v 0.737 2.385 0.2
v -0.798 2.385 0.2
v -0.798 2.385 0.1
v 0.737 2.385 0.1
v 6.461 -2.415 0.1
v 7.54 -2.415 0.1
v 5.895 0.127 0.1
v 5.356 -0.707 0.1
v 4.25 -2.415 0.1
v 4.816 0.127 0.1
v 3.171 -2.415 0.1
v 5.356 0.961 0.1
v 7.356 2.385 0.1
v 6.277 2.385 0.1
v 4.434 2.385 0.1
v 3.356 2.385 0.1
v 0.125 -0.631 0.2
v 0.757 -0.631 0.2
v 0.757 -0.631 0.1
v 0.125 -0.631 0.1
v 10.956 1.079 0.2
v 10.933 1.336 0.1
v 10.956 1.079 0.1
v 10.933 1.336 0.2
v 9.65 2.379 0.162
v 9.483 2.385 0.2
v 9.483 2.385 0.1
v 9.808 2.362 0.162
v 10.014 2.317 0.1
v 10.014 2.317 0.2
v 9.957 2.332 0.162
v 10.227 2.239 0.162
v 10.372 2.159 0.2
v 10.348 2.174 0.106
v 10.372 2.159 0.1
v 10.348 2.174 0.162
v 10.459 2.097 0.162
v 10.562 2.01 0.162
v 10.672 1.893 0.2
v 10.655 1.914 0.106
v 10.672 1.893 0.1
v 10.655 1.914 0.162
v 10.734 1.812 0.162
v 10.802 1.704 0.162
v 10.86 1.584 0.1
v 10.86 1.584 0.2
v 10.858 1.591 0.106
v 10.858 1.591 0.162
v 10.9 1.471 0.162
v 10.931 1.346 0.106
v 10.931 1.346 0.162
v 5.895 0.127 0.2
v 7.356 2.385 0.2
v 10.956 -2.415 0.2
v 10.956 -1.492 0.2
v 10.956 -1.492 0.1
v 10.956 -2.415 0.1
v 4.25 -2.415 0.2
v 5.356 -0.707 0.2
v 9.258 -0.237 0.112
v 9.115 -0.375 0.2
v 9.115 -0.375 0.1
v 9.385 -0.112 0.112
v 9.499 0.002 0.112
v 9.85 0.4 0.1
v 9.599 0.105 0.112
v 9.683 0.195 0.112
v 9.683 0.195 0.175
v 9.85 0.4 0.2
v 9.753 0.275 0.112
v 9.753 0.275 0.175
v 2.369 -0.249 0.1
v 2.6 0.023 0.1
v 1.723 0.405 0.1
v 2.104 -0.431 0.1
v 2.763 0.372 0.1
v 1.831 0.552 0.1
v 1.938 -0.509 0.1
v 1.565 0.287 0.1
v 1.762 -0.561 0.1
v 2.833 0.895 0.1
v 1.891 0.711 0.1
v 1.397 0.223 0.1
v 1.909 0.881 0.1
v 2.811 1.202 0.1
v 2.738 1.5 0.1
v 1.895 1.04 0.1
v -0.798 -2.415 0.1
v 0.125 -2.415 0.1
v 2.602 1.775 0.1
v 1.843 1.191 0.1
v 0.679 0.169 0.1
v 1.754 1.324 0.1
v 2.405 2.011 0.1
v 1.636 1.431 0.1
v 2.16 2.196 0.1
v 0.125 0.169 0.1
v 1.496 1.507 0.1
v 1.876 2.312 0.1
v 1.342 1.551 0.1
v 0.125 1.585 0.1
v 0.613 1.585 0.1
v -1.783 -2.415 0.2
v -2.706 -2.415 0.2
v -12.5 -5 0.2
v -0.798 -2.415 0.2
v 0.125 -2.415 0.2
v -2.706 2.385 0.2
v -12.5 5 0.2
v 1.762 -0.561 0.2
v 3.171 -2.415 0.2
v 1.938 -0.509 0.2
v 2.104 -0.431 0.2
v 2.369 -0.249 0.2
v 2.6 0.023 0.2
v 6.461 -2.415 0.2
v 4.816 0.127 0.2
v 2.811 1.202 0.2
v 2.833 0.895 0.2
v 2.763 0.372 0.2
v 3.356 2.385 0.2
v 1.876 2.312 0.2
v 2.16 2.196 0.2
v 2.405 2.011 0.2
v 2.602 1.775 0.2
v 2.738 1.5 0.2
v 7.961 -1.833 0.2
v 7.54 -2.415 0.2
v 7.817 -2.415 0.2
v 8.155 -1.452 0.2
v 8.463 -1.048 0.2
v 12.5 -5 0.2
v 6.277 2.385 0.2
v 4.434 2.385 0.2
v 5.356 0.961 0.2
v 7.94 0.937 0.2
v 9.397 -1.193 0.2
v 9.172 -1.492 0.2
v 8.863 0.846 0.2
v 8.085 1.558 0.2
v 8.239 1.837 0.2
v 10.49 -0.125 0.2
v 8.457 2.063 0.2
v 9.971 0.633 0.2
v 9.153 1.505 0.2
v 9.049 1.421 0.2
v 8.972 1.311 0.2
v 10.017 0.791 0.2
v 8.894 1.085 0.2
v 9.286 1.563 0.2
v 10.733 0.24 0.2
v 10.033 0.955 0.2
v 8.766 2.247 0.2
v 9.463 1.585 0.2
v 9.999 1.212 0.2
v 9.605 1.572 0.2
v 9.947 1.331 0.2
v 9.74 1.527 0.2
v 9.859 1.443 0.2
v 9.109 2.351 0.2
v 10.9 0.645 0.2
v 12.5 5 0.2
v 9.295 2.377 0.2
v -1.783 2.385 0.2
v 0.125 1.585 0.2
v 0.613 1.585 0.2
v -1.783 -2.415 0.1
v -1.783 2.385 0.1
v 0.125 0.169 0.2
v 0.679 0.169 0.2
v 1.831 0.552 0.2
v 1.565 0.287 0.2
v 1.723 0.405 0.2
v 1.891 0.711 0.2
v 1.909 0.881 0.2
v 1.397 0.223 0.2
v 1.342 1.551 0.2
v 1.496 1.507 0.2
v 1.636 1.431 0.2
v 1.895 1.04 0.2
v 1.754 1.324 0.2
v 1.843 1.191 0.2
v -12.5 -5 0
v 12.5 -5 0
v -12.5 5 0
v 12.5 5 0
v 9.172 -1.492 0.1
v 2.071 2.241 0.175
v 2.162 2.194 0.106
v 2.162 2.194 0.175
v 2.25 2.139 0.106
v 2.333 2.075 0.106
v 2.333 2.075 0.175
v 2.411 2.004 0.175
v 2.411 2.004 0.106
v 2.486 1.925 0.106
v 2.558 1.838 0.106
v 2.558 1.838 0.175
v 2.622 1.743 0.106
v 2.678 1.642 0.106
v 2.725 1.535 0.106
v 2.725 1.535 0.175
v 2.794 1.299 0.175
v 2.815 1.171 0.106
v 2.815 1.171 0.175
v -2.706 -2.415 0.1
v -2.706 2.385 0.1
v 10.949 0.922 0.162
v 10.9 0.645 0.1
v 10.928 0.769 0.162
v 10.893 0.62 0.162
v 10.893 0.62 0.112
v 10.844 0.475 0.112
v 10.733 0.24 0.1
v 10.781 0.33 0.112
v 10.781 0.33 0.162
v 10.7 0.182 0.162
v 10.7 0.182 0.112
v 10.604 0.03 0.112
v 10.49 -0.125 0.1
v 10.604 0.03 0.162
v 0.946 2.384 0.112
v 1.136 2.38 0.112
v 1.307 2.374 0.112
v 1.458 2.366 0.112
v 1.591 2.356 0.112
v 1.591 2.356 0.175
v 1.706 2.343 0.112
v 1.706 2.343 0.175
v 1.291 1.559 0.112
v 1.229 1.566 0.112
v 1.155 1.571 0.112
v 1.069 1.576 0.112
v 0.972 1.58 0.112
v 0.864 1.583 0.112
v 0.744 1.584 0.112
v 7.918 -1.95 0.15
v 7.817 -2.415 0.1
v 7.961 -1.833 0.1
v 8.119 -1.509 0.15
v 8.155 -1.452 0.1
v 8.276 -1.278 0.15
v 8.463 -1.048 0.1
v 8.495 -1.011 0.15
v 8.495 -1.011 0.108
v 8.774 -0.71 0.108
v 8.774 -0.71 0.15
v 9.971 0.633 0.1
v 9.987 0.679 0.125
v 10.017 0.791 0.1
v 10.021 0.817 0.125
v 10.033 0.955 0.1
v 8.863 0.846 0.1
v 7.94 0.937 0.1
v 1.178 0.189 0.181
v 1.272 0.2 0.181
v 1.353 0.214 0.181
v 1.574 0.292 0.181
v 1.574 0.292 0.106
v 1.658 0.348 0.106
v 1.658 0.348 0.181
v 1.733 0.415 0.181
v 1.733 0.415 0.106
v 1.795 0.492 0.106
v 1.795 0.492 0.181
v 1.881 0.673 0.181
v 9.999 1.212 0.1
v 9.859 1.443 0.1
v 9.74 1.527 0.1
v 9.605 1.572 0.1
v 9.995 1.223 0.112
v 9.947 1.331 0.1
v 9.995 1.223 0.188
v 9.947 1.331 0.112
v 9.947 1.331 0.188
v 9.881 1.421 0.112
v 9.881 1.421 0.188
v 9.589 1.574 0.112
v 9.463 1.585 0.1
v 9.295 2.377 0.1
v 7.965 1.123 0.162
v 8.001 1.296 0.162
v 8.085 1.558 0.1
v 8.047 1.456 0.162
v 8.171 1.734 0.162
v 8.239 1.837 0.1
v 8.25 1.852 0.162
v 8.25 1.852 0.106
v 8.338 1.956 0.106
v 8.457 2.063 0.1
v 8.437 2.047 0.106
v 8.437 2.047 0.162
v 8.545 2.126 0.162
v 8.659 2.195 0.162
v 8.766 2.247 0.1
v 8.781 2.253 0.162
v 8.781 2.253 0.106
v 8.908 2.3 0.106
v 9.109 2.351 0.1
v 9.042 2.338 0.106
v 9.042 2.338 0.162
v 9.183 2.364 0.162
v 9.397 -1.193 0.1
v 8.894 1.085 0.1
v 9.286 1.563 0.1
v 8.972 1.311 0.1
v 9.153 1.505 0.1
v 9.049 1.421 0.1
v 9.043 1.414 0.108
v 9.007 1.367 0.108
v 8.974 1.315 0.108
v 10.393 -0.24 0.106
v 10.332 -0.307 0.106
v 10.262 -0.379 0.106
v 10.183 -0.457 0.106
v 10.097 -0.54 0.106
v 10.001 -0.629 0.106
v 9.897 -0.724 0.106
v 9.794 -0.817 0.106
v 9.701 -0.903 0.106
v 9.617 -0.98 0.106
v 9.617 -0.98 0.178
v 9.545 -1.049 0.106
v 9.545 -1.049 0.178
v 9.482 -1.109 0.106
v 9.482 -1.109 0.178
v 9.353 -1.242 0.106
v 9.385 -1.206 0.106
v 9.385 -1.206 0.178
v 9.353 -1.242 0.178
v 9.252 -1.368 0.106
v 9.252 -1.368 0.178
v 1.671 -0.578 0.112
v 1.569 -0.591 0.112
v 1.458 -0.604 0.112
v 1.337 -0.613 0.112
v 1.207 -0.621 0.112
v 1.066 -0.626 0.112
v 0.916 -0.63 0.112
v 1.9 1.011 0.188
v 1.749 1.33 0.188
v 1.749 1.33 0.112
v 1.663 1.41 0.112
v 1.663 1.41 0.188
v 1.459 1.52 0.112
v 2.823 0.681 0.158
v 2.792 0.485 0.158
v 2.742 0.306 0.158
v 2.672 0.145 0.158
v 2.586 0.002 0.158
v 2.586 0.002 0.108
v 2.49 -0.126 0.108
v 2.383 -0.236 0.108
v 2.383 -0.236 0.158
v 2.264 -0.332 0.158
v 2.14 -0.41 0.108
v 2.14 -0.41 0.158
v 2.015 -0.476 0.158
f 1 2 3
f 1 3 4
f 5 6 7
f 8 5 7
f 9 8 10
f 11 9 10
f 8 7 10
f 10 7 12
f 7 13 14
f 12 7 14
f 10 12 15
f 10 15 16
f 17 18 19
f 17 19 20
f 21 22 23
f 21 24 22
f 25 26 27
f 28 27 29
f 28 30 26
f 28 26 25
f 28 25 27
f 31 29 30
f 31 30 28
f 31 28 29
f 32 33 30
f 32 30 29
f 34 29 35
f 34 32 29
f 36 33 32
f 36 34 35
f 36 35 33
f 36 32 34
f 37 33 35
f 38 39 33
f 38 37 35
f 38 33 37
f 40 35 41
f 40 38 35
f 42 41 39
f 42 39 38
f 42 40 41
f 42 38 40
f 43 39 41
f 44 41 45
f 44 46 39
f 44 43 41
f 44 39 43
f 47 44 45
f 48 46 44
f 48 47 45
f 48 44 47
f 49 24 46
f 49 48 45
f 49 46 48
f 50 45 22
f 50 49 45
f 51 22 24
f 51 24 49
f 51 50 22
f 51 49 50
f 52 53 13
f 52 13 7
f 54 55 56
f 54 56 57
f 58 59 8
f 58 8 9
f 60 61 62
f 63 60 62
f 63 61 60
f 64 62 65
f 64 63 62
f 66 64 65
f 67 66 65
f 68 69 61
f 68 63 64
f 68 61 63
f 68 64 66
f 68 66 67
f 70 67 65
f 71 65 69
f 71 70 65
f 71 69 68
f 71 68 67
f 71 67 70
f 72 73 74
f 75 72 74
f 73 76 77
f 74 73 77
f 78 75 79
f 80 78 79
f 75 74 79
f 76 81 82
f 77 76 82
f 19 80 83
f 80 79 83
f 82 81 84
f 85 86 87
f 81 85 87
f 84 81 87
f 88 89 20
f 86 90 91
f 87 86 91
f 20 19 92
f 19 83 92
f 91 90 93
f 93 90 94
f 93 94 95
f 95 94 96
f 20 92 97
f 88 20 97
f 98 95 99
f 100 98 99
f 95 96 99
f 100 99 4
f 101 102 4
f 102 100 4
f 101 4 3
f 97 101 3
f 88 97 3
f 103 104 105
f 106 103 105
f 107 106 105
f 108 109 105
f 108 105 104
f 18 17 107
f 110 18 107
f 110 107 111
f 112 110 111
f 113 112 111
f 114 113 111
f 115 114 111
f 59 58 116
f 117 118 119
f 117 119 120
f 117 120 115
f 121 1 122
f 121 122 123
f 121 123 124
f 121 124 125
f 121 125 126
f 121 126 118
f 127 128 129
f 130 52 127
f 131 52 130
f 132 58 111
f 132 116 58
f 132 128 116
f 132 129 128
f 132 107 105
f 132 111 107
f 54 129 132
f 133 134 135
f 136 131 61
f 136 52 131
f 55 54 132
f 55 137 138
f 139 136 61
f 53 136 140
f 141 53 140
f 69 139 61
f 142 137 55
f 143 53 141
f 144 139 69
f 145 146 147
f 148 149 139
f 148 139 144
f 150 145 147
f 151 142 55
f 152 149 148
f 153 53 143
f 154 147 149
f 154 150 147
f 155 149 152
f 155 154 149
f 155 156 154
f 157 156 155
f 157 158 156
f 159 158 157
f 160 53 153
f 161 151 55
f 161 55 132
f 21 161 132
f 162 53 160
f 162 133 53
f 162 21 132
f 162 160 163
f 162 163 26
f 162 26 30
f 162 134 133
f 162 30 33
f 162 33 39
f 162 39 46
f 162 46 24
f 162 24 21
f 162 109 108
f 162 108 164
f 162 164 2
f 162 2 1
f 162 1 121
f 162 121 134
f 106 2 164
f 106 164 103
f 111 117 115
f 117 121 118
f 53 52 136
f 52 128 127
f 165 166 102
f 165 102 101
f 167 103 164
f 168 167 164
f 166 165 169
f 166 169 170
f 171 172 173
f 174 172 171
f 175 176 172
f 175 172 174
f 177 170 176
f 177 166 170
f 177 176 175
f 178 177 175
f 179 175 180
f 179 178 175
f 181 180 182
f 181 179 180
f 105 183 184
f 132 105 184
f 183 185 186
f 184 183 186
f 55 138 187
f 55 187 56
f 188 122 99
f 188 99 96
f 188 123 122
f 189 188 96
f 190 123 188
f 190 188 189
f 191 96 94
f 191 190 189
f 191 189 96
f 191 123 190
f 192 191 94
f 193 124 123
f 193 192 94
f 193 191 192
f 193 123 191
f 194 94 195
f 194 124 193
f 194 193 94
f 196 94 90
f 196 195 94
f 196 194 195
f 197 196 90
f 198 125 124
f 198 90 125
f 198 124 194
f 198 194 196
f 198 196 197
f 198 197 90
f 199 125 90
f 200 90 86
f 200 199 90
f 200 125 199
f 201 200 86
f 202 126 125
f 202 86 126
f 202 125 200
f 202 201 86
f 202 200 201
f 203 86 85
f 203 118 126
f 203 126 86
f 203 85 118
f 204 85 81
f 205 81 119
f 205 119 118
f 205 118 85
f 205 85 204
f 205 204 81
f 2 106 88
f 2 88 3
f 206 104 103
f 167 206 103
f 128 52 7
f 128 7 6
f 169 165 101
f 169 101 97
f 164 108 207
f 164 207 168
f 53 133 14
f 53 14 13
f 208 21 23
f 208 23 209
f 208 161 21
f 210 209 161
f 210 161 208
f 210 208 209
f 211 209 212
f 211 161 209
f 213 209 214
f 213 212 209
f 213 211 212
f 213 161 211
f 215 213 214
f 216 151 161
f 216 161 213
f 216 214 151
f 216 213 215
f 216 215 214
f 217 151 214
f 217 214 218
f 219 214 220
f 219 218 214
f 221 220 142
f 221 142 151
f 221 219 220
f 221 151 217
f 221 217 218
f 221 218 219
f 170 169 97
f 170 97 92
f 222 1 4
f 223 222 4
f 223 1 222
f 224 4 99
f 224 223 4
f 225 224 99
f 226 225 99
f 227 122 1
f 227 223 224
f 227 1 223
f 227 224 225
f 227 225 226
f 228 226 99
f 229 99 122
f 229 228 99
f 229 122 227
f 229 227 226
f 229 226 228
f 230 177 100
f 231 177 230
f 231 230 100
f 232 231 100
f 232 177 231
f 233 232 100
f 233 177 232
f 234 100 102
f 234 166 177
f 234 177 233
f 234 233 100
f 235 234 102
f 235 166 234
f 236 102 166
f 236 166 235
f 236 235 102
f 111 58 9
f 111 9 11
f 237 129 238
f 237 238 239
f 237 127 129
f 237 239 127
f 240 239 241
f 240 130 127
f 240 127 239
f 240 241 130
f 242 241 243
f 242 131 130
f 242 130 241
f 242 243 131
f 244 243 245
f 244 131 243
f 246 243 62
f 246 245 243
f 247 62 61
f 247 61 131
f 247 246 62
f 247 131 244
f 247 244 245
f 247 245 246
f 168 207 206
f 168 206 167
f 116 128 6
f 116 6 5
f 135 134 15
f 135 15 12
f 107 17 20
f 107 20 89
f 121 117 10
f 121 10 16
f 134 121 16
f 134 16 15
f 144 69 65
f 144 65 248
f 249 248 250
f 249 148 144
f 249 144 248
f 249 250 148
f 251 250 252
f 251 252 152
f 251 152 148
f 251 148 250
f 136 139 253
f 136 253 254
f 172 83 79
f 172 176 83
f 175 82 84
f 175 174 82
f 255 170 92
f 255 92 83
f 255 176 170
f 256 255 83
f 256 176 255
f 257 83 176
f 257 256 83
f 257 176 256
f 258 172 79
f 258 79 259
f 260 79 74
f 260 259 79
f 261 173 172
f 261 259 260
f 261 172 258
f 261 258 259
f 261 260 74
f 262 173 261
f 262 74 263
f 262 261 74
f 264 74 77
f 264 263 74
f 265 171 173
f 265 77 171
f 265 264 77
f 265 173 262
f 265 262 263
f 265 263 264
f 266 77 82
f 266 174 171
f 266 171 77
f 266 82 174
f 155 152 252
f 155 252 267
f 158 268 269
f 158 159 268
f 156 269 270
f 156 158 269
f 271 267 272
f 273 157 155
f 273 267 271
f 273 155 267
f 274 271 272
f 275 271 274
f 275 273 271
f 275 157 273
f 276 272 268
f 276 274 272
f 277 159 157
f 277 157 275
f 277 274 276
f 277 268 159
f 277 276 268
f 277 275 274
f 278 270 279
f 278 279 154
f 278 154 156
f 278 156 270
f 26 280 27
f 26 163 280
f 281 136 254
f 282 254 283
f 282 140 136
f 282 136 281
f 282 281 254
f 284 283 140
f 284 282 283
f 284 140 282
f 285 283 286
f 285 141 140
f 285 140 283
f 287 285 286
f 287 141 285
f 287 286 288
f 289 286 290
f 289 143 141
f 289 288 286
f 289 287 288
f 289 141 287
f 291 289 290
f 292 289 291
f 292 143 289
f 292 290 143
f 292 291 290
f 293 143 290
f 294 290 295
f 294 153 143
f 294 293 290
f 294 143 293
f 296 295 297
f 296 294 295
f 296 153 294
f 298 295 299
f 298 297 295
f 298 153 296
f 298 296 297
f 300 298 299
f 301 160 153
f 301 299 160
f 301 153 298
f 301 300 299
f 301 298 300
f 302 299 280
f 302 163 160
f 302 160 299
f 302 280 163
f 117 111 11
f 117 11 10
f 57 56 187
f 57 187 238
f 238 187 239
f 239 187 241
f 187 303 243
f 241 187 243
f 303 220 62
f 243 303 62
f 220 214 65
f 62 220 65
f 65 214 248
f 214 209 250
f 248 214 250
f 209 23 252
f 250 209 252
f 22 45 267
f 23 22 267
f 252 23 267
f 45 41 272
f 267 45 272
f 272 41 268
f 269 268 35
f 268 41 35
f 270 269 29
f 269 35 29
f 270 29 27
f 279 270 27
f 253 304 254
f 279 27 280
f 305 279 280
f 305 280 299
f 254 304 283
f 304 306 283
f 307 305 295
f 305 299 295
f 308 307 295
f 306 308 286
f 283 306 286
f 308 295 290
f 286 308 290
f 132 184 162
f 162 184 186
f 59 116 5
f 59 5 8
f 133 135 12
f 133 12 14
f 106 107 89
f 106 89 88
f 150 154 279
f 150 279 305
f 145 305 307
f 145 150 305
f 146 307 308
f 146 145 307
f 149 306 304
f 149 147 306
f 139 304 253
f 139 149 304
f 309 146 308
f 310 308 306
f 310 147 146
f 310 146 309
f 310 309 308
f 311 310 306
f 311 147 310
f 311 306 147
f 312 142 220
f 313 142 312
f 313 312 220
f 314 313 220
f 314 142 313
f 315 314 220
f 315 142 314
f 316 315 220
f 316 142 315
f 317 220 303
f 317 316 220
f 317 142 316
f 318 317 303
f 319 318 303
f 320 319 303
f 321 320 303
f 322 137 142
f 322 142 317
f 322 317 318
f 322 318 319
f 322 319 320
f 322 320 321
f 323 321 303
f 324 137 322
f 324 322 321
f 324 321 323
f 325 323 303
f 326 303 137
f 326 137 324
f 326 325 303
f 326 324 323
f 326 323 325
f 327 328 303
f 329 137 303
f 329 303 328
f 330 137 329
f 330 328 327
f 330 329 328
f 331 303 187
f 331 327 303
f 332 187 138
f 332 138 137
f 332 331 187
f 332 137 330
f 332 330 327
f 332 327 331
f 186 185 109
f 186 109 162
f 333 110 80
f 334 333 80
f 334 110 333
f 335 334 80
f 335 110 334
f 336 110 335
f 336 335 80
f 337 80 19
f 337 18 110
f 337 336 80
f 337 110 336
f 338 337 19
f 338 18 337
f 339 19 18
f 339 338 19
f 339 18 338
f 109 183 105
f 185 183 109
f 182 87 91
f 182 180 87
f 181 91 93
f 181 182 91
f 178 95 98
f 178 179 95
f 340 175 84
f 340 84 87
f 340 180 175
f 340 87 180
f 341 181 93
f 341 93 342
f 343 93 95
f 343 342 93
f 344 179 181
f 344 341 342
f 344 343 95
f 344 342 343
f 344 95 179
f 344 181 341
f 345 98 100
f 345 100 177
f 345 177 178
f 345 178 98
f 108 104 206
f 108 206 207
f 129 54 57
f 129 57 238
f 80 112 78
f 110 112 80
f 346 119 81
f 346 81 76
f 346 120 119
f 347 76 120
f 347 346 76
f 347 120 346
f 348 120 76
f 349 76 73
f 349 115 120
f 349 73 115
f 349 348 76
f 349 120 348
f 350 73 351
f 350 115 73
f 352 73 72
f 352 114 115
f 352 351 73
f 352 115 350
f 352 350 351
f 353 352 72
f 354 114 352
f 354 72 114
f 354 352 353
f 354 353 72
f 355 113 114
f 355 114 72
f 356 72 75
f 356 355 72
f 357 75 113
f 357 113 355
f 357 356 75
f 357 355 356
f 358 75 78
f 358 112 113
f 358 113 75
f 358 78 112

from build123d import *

# Parameters (mm, degrees)
SKETCH1_W           = 25
SKETCH1_H           = 10
BOSS_EXTRUDE1_DEPTH = 0.2
SKETCH2_W           = 0.923076923
SKETCH2_H           = 4.8
CUT_EXTRUDE1_DEPTH  = 0.1


with BuildPart() as part:
    # Sketch1 → Boss-Extrude1 (new body)
    with BuildSketch(Plane.XY):
        Rectangle(SKETCH1_W, SKETCH1_H)
    extrude(amount=BOSS_EXTRUDE1_DEPTH)

    # Sketch2 → Cut-Extrude1 (cut)
    # profile 1 of 4: a face of its own
    with BuildSketch(Plane.XY.offset(0.2)):
        with Locations((-2.244411501, -0.015241632)):
            Rectangle(SKETCH2_W, SKETCH2_H)
    # profile 2 of 4: a face of its own
    with BuildSketch(Plane.XY.offset(0.2)):
        with BuildLine():
            Line((-0.798257654, -2.415241632), (-0.798257654, 2.384758368))
            Line((-0.798257654, 2.384758368), (0.737319269, 2.384758368))
            add(Edge.make_bspline(
                [(0.737319269, 2.384758368), (0.806872824, 2.384682412), (0.939902268, 2.384537138), (1.129660722, 2.380500805), (1.300509782, 2.374786932), (1.452195879, 2.367670544), (1.585252756, 2.357051526), (1.699083537, 2.344754864), (1.794405005, 2.331526919), (1.850536994, 2.317837764), (1.875780807, 2.311681445)],
                knots=[0, 0, 0, 0, 1.460485487, 2.793352117, 3.985295279, 5.050041172, 5.981765236, 6.787433016, 7.454681457, 8, 8, 8, 8], degree=3))
            add(Edge.make_bspline(
                [(1.875780807, 2.311681445), (1.90934894, 2.302109877), (1.975973819, 2.283112556), (2.071426495, 2.242613286), (2.163427759, 2.195676794), (2.250821715, 2.139736978), (2.333905442, 2.075786969), (2.412925902, 2.004348288), (2.488304501, 1.925098444), (2.558998473, 1.838193992), (2.623745835, 1.744073149), (2.679703823, 1.642596759), (2.726584917, 1.534205891), (2.76652683, 1.419715089), (2.795996164, 1.297896825), (2.81661934, 1.169597507), (2.830975644, 1.034761019), (2.831992115, 0.942489924), (2.832511577, 0.895335291)],
                knots=[0, 0, 0, 0, 0.907145743, 1.80047177, 2.69161667, 3.591261238, 4.495029544, 5.415863088, 6.359363025, 7.337192411, 8.326890979, 9.326929023, 10.346104993, 11.395420813, 12.477187422, 13.601053412, 14.774031606, 16, 16, 16, 16], degree=3))
            add(Edge.make_bspline(
                [(2.832511577, 0.895335291), (2.831030074, 0.82372562), (2.828178101, 0.68587307), (2.796269582, 0.488244732), (2.747601242, 0.307723985), (2.676468945, 0.146049619), (2.589743899, 0.002587197), (2.494214475, -0.126743499), (2.385133912, -0.238044311), (2.267281986, -0.333111429), (2.142734039, -0.410910414), (2.017960635, -0.477232945), (1.891278139, -0.528223825), (1.804906295, -0.550440962), (1.762319269, -0.561395478)],
                knots=[0, 0, 0, 0, 1.312386234, 2.526415563, 3.661883817, 4.733421185, 5.753802465, 6.732107337, 7.675884281, 8.604170108, 9.50284679, 10.365392406, 11.194030444, 12, 12, 12, 12], degree=3))
            add(Edge.make_bspline(
                [(1.762319269, -0.561395478), (1.731922738, -0.567177613), (1.667850478, -0.579365662), (1.566235707, -0.591514929), (1.455165255, -0.604962844), (1.334182281, -0.613734329), (1.203433144, -0.621948457), (1.062968615, -0.625826618), (0.912989431, -0.630499015), (0.809759796, -0.630582972), (0.756550038, -0.630626247)],
                knots=[0, 0, 0, 0, 0.735353946, 1.55003838, 2.431865514, 3.394945452, 4.432993119, 5.54609699, 6.735134699, 8, 8, 8, 8], degree=3))
            Line((0.756550038, -0.630626247), (0.124819269, -0.630626247))
            Line((0.124819269, -0.630626247), (0.124819269, -2.415241632))
            Line((0.124819269, -2.415241632), (-0.798257654, -2.415241632))
        make_face()
        with BuildLine():
            Line((0.124819269, 1.584758368), (0.124819269, 0.169373753))
            Line((0.124819269, 0.169373753), (0.678665423, 0.169373753))
            add(Edge.make_bspline(
                [(0.678665423, 0.169373753), (0.726426028, 0.169435598), (0.817798074, 0.169553918), (0.948896691, 0.173800879), (1.067567284, 0.178985083), (1.174057811, 0.187566001), (1.267725465, 0.198875446), (1.349197518, 0.212402966), (1.418568922, 0.226919409), (1.493584651, 0.25097548), (1.573791463, 0.289896011), (1.659442913, 0.345834589), (1.73468761, 0.412715757), (1.797301172, 0.491265373), (1.847315545, 0.578538546), (1.883125873, 0.673640874), (1.906248568, 0.774996178), (1.908360615, 0.845207624), (1.909434654, 0.880912214)],
                knots=[0, 0, 0, 0, 1.411705958, 2.700771114, 3.876961699, 4.922619712, 5.858038221, 6.66485904, 7.363650596, 7.950905807, 8.989198271, 9.987739806, 10.967313358, 11.951275539, 12.944273208, 13.927870418, 14.946261014, 16, 16, 16, 16], degree=3))
            add(Edge.make_bspline(
                [(1.909434654, 0.880912214), (1.907923062, 0.924399848), (1.904992286, 1.008716635), (1.872674008, 1.128797813), (1.822810598, 1.237772937), (1.751520078, 1.3322513), (1.665402808, 1.411699834), (1.56861059, 1.477803839), (1.459076384, 1.524063925), (1.381555525, 1.541988001), (1.342126961, 1.551104522)],
                knots=[0, 0, 0, 0, 1.085904563, 2.105425768, 3.088705091, 4.068969419, 5.045188284, 6.010769642, 6.988240112, 8, 8, 8, 8], degree=3))
            add(Edge.make_bspline(
                [(1.342126961, 1.551104522), (1.325159949, 1.553818257), (1.287498444, 1.559841908), (1.224897357, 1.566128336), (1.150840262, 1.571845837), (1.065237889, 1.576540076), (0.968429546, 1.580209883), (0.860095914, 1.58342554), (0.74052231, 1.583683875), (0.656869768, 1.58439028), (0.613280807, 1.584758368)],
                knots=[0, 0, 0, 0, 0.564603001, 1.253243608, 2.066786758, 3.005752288, 4.070476343, 5.250658742, 6.567396469, 8, 8, 8, 8], degree=3))
            Line((0.613280807, 1.584758368), (0.124819269, 1.584758368))
        make_face(mode=Mode.SUBTRACT)
    # profile 3 of 4: a face of its own
    with BuildSketch(Plane.XY.offset(0.2)):
        Polygon((3.170973115, -2.415241632), (4.816165423, 0.12706606), (3.3555885, 2.384758368), (4.434434654, 2.384758368), (5.3555885, 0.960719906), (6.276742346, 2.384758368), (7.3555885, 2.384758368), (5.895011577, 0.12706606), (7.540203884, -2.415241632), (6.46135773, -2.415241632), (5.3555885, -0.706587786), (4.249819269, -2.415241632), align=None)
    # profile 4 of 4: a face of its own
    with BuildSketch(Plane.XY.offset(0.2)):
        with BuildLine():
            Line((10.9555885, -1.492164709), (10.9555885, -2.415241632))
            Line((10.9555885, -2.415241632), (7.817126961, -2.415241632))
            add(Edge.make_bspline(
                [(7.817126961, -2.415241632), (7.827753065, -2.336351316), (7.848999314, -2.178614919), (7.91468512, -1.948201744), (8.002353171, -1.723357854), (8.097500189, -1.540389503), (8.192134438, -1.393106276), (8.277996096, -1.272421263), (8.380425902, -1.144017588), (8.497937489, -1.006858679), (8.629881438, -0.86051578), (8.777242138, -0.705532962), (8.940722521, -0.542652172), (9.055733882, -0.432048101), (9.115203884, -0.374857017)],
                knots=[0, 0, 0, 0, 1.156289446, 2.311930546, 3.473459201, 4.661751613, 5.303057008, 6.018253237, 6.81459331, 7.690699809, 8.644447906, 9.679642995, 10.800191253, 12, 12, 12, 12], degree=3))
            add(Edge.make_bspline(
                [(9.115203884, -0.374857017), (9.162661627, -0.329047303), (9.25300719, -0.241839099), (9.381659449, -0.116960486), (9.49475804, -0.002161545), (9.594667701, 0.099582791), (9.679080375, 0.190863191), (9.749106435, 0.27024611), (9.805632752, 0.33805482), (9.836247454, 0.381072708), (9.849819269, 0.400142983)],
                knots=[0, 0, 0, 0, 1.480720495, 2.818855715, 4.024636094, 5.098235712, 6.019786162, 6.815086302, 7.474715479, 8, 8, 8, 8], degree=3))
            add(Edge.make_bspline(
                [(9.849819269, 0.400142983), (9.877611033, 0.446308072), (9.931218126, 0.53535518), (9.99000275, 0.675383368), (10.025287473, 0.815382631), (10.030129492, 0.908929337), (10.032511577, 0.954950676)],
                knots=[0, 0, 0, 0, 1.0911822, 2.104764037, 3.067617678, 4, 4, 4, 4], degree=3))
            add(Edge.make_bspline(
                [(10.032511577, 0.954950676), (10.030782777, 1.002842066), (10.027512022, 1.09344884), (10.000086181, 1.221311753), (9.951450902, 1.331228041), (9.884489072, 1.423535093), (9.799815705, 1.495857314), (9.700830076, 1.549296416), (9.586083195, 1.578841274), (9.505432318, 1.582727345), (9.463280807, 1.584758368)],
                knots=[0, 0, 0, 0, 1.193122327, 2.257294386, 3.237245624, 4.168877528, 5.075331632, 5.990371598, 6.949684428, 8, 8, 8, 8], degree=3))
            add(Edge.make_bspline(
                [(9.463280807, 1.584758368), (9.421414069, 1.582861545), (9.34053657, 1.579197291), (9.225592095, 1.547186877), (9.125036894, 1.491773483), (9.05337591, 1.428624575), (9.004965516, 1.367216849), (8.971980362, 1.31370406), (8.943549735, 1.252897122), (8.918357827, 1.185480619), (8.898459068, 1.110682223), (8.882433843, 1.0290716), (8.86951983, 0.94020957), (8.865412946, 0.878390798), (8.863280807, 0.846296829)],
                knots=[0, 0, 0, 0, 1.402788338, 2.709884207, 3.961032948, 5.225417836, 5.883680772, 6.578928686, 7.329201998, 8.132101139, 8.990263233, 9.922304639, 10.921339128, 12, 12, 12, 12], degree=3))
            Line((8.863280807, 0.846296829), (7.940203884, 0.936681445))
            add(Edge.make_bspline(
                [(7.940203884, 0.936681445), (7.94762528, 0.999000772), (7.96201418, 1.11982799), (7.997921921, 1.293377536), (8.043397745, 1.453484825), (8.100609637, 1.599852729), (8.167192961, 1.733412005), (8.24654402, 1.852158512), (8.335890203, 1.957407626), (8.435308726, 2.049103332), (8.544167554, 2.127537337), (8.658395361, 2.197551722), (8.780224478, 2.254985774), (8.908313561, 2.302320063), (9.042604726, 2.340149248), (9.183719088, 2.365161392), (9.33078574, 2.38275503), (9.431174051, 2.384080524), (9.482511577, 2.384758368)],
                knots=[0, 0, 0, 0, 1.270971563, 2.464210789, 3.586263665, 4.638946707, 5.643716971, 6.603612468, 7.52484387, 8.434700188, 9.336036235, 10.239171475, 11.145359471, 12.059630629, 13.003312604, 13.96741569, 14.960557767, 16, 16, 16, 16], degree=3))
            add(Edge.make_bspline(
                [(9.482511577, 2.384758368), (9.5383221, 2.383685719), (9.647020101, 2.3815966), (9.805699887, 2.364344637), (9.954768144, 2.334263341), (10.095528133, 2.294416407), (10.226534323, 2.241217837), (10.348878384, 2.176902977), (10.460634835, 2.09903095), (10.563469558, 2.011848446), (10.655395572, 1.915975961), (10.735914442, 1.813711747), (10.803372887, 1.70512705), (10.859980881, 1.5915454), (10.902011935, 1.471139101), (10.932637588, 1.345573044), (10.95294363, 1.214261436), (10.954697126, 1.124578586), (10.9555885, 1.078989137)],
                knots=[0, 0, 0, 0, 1.210756838, 2.35810096, 3.457354827, 4.507168606, 5.527358126, 6.519769748, 7.499700793, 8.476517721, 9.440526811, 10.376769937, 11.295256217, 12.209626307, 13.124630862, 14.055668209, 15.011616881, 16, 16, 16, 16], degree=3))
            add(Edge.make_bspline(
                [(10.9555885, 1.078989137), (10.954414127, 1.026666934), (10.952084351, 0.922867713), (10.929778476, 0.769421454), (10.895699443, 0.619513646), (10.845333315, 0.472777928), (10.781490337, 0.325694452), (10.699195208, 0.177933075), (10.60364434, 0.025037576), (10.528831776, -0.073816036), (10.490203884, -0.124857017)],
                knots=[0, 0, 0, 0, 0.953409949, 1.89141903, 2.821310783, 3.752688675, 4.715703262, 5.740811754, 6.833515735, 8, 8, 8, 8], degree=3))
            add(Edge.make_bspline(
                [(10.490203884, -0.124857017), (10.475604237, -0.143245315), (10.444335177, -0.182628789), (10.391138289, -0.243017256), (10.329487671, -0.308980498), (10.260254111, -0.381753196), (10.181150689, -0.458758268), (10.09502355, -0.543216008), (9.99808285, -0.630806122), (9.897675776, -0.723713556), (9.796832264, -0.814139056), (9.704142538, -0.900023233), (9.619949425, -0.976012284), (9.548173955, -1.046301153), (9.484594315, -1.106092675), (9.431502124, -1.15845289), (9.387903903, -1.2021142), (9.327828359, -1.270171105), (9.251389048, -1.362218097), (9.197610867, -1.450171602), (9.171934654, -1.492164709)],
                knots=[0, 0, 0, 0, 0.665555651, 1.425465941, 2.280616993, 3.225313414, 4.272635571, 5.410053715, 6.644756443, 7.976022804, 9.288331007, 10.484517221, 11.558462543, 12.503158964, 13.33222979, 14.032602617, 14.617328242, 15.080653724, 16.606167857, 18, 18, 18, 18], degree=3))
            Line((9.171934654, -1.492164709), (10.9555885, -1.492164709))
        make_face()
    extrude(amount=-CUT_EXTRUDE1_DEPTH, mode=Mode.SUBTRACT)


solid = part.part
